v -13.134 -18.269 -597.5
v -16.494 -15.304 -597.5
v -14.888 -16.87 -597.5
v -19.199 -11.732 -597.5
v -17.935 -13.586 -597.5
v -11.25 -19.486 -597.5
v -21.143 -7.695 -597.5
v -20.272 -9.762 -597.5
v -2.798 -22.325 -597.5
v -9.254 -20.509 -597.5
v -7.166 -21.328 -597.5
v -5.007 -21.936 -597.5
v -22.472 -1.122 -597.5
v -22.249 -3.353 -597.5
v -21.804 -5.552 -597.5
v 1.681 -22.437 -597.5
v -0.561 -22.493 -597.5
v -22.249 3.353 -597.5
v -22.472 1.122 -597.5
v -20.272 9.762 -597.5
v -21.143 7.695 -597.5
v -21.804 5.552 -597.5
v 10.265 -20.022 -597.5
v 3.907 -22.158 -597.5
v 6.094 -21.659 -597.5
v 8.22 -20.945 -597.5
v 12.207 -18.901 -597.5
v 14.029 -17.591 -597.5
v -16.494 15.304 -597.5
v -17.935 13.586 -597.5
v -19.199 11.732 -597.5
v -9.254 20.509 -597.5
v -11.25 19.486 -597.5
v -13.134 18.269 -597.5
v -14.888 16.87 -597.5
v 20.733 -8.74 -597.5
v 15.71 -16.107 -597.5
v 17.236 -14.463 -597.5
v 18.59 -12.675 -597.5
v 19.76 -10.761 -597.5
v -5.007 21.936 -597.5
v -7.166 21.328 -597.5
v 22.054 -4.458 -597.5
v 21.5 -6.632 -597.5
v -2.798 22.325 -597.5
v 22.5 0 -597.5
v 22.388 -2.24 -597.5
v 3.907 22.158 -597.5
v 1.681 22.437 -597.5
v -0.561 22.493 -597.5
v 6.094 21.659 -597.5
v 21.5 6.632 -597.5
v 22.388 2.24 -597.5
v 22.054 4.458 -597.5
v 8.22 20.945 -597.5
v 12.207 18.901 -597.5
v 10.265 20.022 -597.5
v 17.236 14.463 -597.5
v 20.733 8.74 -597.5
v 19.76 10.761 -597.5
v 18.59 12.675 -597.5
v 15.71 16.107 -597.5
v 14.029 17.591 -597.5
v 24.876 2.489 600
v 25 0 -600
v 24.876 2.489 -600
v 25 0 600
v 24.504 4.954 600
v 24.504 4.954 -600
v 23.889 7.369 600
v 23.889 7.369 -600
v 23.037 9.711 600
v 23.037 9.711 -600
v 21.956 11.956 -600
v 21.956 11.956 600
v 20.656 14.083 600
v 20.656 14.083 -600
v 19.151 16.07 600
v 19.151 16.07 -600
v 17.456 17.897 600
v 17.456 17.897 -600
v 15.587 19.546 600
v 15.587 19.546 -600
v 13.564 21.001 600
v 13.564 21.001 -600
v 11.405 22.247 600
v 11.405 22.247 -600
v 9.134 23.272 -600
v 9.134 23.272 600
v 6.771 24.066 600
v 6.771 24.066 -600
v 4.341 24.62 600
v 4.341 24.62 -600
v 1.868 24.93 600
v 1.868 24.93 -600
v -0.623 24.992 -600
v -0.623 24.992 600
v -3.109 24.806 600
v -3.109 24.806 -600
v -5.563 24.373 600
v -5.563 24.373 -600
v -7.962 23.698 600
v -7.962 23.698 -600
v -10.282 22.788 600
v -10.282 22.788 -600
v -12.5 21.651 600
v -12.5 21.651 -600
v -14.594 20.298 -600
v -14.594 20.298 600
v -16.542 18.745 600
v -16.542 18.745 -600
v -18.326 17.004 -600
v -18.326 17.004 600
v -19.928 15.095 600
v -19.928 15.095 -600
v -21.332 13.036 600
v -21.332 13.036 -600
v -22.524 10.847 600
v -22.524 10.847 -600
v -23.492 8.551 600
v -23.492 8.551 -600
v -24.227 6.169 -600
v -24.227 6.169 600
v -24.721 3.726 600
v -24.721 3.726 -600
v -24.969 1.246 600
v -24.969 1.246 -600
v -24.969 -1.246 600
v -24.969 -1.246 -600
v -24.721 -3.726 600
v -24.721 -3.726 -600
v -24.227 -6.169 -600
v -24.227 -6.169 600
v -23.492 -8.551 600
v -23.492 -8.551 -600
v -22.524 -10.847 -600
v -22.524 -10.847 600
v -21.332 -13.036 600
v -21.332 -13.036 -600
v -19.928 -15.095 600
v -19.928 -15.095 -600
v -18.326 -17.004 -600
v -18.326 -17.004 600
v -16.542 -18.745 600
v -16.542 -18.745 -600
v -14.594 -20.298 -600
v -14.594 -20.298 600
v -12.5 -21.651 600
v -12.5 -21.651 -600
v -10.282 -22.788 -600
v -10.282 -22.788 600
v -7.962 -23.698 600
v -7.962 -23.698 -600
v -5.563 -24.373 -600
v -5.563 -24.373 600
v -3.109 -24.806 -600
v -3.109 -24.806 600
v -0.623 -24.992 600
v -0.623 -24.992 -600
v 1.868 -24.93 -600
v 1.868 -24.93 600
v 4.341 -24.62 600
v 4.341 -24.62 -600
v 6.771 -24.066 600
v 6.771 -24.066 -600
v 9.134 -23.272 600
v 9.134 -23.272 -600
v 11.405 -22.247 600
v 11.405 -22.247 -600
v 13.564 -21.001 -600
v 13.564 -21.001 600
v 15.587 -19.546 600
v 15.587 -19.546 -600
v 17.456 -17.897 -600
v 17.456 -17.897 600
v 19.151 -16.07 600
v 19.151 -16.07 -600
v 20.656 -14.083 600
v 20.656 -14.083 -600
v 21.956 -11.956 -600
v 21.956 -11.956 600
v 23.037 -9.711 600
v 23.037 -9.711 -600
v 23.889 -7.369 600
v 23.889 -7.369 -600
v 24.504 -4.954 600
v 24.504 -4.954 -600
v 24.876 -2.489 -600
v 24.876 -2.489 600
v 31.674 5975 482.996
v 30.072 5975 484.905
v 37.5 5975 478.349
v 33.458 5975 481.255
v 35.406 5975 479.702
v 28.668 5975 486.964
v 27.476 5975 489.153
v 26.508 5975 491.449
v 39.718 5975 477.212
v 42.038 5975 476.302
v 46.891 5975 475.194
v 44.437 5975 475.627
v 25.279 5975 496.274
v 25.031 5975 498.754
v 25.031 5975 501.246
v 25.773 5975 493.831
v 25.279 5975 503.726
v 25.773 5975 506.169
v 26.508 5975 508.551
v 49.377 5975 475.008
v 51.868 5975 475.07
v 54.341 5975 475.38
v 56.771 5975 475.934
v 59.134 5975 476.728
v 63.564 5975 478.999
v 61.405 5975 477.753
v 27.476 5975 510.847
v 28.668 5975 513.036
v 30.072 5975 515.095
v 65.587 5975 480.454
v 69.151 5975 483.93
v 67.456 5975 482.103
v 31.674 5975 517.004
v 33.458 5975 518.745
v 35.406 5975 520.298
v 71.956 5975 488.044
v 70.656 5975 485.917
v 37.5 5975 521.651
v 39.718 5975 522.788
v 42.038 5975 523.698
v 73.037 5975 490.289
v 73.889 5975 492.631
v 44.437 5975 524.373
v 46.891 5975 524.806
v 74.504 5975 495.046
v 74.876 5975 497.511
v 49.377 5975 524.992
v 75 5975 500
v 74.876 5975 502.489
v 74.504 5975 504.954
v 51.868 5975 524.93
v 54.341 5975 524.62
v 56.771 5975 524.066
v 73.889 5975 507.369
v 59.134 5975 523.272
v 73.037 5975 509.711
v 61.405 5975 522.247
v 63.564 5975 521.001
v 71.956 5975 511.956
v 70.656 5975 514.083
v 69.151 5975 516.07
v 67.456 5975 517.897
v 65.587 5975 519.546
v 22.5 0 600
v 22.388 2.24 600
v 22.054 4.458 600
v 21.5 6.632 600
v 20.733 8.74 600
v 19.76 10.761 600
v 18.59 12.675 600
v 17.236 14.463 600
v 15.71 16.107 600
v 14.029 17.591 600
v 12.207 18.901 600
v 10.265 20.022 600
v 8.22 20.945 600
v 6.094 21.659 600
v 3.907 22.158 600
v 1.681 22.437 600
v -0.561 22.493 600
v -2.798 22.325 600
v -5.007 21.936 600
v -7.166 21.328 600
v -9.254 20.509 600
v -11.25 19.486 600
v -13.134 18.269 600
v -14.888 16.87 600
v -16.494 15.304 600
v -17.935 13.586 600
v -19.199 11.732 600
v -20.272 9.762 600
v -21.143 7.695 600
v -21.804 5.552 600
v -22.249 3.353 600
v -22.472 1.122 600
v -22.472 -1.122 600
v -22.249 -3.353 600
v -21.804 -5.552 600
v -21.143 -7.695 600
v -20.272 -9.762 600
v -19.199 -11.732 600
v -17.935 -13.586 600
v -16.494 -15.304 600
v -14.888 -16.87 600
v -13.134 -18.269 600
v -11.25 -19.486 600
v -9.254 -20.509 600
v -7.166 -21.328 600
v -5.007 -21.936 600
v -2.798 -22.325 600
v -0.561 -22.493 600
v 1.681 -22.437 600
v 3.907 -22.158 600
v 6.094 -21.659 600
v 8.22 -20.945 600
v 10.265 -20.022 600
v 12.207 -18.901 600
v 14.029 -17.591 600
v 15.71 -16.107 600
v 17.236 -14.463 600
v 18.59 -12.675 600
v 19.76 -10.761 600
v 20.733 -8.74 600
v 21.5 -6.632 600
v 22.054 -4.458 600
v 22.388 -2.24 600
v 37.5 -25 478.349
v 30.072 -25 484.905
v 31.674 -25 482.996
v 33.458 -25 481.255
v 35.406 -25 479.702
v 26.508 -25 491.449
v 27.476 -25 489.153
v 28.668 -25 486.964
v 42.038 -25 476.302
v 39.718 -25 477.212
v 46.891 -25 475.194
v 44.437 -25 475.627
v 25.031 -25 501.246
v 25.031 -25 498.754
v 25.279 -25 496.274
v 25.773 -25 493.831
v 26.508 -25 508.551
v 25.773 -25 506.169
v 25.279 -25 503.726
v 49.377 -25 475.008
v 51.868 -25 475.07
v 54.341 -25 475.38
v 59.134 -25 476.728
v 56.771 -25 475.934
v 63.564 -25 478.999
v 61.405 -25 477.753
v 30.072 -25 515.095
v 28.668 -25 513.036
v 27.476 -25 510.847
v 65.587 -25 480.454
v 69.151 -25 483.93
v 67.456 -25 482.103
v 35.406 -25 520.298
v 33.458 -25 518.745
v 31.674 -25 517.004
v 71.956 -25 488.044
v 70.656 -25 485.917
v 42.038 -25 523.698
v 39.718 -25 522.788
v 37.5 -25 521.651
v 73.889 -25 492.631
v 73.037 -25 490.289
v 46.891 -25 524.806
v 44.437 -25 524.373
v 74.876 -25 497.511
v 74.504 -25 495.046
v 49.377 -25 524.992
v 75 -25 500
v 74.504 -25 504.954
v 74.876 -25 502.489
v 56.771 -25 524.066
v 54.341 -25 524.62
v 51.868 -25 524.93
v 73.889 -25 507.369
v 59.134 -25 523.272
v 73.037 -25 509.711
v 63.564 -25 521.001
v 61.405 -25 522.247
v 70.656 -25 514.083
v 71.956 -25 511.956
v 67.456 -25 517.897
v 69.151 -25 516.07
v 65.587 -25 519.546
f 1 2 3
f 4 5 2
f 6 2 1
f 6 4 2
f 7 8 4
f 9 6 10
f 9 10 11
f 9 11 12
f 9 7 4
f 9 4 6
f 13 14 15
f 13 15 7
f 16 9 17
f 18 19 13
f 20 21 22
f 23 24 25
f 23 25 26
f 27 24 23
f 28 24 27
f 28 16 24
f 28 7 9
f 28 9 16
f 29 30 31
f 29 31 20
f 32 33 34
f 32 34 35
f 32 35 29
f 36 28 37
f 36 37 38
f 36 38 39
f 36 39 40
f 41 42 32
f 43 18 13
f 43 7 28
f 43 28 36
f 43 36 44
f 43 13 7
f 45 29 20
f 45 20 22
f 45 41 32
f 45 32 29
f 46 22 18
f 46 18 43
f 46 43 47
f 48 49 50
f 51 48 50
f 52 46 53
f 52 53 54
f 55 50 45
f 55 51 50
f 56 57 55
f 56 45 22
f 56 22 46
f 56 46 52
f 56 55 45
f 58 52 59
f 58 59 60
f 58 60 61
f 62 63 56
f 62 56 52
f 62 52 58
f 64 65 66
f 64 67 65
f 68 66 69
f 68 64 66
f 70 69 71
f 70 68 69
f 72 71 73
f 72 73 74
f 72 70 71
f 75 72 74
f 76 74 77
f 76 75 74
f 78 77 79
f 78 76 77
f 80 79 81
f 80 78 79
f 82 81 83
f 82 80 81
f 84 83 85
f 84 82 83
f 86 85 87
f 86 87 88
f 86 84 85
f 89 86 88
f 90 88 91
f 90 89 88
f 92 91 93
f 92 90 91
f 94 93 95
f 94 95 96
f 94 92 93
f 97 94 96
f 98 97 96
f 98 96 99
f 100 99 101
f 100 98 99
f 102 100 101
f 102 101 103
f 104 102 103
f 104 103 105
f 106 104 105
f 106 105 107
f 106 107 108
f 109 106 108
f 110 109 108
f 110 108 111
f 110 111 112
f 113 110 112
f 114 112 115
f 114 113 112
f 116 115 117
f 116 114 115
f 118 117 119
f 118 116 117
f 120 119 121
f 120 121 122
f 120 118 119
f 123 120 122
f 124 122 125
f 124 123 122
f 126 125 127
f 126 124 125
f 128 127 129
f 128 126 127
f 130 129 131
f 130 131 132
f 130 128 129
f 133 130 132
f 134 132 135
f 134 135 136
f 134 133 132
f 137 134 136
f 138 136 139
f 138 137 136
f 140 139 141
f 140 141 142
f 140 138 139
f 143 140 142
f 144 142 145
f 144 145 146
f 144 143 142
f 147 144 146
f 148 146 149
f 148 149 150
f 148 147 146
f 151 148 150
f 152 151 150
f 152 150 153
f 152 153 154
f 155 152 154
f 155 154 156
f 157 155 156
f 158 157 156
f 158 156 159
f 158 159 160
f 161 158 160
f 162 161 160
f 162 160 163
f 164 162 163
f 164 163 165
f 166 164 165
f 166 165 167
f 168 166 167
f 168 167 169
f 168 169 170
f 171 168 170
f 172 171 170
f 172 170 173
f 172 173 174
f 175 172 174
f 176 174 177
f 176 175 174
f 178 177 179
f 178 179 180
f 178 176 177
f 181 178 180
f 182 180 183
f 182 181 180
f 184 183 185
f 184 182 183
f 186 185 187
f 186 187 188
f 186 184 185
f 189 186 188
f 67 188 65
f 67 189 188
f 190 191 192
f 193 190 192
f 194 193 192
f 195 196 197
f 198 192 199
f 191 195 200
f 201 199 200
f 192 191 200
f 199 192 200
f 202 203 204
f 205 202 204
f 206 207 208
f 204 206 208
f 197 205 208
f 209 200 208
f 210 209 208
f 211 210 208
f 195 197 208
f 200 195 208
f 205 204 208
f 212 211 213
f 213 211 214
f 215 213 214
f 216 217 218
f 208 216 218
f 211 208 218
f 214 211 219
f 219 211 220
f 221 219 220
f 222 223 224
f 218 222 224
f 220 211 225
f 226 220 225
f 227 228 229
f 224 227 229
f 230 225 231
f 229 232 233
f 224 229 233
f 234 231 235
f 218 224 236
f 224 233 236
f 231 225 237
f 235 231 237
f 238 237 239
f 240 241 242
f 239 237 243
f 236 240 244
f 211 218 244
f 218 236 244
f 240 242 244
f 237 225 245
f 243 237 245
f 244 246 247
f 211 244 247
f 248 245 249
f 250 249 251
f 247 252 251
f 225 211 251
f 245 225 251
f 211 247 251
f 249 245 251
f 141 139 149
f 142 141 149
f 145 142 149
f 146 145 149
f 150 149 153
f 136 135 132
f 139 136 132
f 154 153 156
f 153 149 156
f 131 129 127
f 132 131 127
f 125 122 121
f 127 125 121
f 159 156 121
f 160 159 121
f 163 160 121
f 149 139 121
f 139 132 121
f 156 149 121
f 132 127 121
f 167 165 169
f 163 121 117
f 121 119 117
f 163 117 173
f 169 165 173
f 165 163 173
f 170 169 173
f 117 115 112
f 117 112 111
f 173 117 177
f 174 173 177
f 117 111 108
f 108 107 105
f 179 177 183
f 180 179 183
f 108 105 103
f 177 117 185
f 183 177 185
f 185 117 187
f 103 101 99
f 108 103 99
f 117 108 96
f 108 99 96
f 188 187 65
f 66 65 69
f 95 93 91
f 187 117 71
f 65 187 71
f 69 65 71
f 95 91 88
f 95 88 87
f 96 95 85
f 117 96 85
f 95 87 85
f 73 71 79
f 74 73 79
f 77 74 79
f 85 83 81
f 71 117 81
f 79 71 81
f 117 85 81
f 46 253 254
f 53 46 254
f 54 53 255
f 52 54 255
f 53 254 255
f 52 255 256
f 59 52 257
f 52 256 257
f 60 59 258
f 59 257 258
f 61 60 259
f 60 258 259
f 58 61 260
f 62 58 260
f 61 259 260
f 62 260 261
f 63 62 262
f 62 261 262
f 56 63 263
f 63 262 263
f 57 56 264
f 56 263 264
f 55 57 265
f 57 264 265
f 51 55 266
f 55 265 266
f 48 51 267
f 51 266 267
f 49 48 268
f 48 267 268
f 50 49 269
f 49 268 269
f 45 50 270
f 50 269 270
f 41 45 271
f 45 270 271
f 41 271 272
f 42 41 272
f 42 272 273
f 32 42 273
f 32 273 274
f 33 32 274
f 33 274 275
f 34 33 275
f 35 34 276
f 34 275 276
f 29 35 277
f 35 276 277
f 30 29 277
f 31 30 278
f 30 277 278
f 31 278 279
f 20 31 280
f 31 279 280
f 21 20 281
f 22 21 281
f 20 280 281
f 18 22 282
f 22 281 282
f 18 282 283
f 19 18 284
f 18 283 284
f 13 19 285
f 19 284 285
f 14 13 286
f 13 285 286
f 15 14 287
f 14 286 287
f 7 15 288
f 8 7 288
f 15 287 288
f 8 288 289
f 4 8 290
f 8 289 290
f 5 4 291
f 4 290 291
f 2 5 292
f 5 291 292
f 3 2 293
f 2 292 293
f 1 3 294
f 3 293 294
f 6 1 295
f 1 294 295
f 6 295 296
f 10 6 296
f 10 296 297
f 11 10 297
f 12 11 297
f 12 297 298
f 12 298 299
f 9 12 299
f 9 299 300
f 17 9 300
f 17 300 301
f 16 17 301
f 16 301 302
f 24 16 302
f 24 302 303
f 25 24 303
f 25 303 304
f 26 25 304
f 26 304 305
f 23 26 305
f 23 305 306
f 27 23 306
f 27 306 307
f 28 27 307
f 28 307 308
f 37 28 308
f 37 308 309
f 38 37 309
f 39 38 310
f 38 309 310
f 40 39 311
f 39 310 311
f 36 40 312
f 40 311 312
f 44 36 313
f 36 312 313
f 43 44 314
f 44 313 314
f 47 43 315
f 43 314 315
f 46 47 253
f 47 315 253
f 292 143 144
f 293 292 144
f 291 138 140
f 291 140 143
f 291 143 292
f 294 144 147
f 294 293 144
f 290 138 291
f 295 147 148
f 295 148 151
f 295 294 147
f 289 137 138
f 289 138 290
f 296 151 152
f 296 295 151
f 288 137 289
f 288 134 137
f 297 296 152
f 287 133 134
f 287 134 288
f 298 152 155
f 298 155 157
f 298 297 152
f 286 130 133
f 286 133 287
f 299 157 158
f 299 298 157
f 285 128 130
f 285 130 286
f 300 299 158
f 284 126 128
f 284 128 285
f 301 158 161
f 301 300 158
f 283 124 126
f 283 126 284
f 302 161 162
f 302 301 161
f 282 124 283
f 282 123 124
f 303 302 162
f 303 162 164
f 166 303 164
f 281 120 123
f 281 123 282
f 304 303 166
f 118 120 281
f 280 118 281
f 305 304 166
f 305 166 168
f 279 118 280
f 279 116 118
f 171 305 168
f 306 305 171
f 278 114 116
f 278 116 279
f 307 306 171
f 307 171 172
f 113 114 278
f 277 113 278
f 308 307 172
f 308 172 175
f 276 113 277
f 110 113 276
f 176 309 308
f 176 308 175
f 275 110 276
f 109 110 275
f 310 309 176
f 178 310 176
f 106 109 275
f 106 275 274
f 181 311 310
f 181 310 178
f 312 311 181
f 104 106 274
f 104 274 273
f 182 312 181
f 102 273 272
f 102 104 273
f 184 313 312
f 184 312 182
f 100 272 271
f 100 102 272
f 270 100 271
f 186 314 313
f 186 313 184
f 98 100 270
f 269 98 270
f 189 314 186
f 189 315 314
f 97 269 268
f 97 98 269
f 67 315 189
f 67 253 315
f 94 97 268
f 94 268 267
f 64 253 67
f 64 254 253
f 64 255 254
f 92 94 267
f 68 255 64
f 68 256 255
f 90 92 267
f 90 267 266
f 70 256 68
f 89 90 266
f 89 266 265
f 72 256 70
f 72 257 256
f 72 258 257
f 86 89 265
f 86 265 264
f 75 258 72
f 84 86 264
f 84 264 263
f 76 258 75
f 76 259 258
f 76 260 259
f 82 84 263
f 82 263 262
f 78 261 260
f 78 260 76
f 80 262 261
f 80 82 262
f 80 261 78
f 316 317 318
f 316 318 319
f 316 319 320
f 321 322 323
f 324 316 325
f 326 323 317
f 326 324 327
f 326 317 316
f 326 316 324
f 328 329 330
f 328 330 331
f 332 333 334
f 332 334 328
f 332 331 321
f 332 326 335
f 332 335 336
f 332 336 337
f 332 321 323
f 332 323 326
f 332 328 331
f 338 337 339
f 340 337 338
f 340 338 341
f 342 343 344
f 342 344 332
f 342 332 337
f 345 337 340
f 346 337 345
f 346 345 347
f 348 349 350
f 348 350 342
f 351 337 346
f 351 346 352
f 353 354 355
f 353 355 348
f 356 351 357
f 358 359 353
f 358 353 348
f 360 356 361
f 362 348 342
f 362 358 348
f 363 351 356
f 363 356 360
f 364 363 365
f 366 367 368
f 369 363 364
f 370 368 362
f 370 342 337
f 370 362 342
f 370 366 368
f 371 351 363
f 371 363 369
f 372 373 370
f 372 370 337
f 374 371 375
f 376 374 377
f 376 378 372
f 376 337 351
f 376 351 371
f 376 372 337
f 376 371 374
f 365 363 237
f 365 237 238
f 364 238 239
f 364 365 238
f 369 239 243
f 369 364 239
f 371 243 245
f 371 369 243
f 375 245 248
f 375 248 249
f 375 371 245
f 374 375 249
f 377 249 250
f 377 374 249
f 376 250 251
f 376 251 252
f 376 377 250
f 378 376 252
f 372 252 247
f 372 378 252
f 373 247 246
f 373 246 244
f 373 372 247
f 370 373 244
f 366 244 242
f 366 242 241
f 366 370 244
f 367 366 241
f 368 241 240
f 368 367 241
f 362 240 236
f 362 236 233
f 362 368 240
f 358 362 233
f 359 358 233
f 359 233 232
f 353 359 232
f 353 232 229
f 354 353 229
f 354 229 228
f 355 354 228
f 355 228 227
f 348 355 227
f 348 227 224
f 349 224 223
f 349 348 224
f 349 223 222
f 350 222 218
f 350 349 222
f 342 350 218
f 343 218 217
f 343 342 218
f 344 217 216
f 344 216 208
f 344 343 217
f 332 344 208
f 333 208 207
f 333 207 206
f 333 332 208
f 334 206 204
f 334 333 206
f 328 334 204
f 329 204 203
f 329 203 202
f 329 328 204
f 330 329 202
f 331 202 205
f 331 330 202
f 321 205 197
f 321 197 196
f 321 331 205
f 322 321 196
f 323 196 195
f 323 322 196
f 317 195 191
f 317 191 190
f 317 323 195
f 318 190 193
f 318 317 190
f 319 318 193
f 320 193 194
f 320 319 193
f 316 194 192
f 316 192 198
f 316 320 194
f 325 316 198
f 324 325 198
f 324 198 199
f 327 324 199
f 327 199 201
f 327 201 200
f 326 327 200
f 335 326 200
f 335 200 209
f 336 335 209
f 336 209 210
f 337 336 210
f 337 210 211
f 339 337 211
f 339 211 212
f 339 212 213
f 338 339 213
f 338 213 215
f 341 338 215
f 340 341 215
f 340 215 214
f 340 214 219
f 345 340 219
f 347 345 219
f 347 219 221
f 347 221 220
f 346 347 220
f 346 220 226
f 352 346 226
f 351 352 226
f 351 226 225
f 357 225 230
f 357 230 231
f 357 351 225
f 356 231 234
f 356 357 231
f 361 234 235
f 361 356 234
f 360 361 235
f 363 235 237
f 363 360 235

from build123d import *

# Parameters (mm, degrees)
F0_R     = 25
F1_DEPTH = 600
F2_T     = -2.5
F4_R     = 25
F5_DEPTH = 6000


with BuildPart() as f1:
    # F0 (on Top) → F1 (new body, symmetric)
    with BuildSketch(Plane.XY):
        Circle(F0_R)
    extrude(amount=F1_DEPTH, both=True)

    # F2
    f2_openings = [f1.faces().sort_by_distance(p)[0] for p in [
        (0, 0, 600),
    ]]
    offset(amount=F2_T, openings=f2_openings)


with BuildPart() as f5:
    # F4 (on offset) → F5 (new body)
    with BuildSketch(Plane.XZ.offset(25)):
        with Locations((50, 500)):
            Circle(F4_R)
    extrude(amount=-F5_DEPTH)


solid = Compound([f1.part, f5.part])
